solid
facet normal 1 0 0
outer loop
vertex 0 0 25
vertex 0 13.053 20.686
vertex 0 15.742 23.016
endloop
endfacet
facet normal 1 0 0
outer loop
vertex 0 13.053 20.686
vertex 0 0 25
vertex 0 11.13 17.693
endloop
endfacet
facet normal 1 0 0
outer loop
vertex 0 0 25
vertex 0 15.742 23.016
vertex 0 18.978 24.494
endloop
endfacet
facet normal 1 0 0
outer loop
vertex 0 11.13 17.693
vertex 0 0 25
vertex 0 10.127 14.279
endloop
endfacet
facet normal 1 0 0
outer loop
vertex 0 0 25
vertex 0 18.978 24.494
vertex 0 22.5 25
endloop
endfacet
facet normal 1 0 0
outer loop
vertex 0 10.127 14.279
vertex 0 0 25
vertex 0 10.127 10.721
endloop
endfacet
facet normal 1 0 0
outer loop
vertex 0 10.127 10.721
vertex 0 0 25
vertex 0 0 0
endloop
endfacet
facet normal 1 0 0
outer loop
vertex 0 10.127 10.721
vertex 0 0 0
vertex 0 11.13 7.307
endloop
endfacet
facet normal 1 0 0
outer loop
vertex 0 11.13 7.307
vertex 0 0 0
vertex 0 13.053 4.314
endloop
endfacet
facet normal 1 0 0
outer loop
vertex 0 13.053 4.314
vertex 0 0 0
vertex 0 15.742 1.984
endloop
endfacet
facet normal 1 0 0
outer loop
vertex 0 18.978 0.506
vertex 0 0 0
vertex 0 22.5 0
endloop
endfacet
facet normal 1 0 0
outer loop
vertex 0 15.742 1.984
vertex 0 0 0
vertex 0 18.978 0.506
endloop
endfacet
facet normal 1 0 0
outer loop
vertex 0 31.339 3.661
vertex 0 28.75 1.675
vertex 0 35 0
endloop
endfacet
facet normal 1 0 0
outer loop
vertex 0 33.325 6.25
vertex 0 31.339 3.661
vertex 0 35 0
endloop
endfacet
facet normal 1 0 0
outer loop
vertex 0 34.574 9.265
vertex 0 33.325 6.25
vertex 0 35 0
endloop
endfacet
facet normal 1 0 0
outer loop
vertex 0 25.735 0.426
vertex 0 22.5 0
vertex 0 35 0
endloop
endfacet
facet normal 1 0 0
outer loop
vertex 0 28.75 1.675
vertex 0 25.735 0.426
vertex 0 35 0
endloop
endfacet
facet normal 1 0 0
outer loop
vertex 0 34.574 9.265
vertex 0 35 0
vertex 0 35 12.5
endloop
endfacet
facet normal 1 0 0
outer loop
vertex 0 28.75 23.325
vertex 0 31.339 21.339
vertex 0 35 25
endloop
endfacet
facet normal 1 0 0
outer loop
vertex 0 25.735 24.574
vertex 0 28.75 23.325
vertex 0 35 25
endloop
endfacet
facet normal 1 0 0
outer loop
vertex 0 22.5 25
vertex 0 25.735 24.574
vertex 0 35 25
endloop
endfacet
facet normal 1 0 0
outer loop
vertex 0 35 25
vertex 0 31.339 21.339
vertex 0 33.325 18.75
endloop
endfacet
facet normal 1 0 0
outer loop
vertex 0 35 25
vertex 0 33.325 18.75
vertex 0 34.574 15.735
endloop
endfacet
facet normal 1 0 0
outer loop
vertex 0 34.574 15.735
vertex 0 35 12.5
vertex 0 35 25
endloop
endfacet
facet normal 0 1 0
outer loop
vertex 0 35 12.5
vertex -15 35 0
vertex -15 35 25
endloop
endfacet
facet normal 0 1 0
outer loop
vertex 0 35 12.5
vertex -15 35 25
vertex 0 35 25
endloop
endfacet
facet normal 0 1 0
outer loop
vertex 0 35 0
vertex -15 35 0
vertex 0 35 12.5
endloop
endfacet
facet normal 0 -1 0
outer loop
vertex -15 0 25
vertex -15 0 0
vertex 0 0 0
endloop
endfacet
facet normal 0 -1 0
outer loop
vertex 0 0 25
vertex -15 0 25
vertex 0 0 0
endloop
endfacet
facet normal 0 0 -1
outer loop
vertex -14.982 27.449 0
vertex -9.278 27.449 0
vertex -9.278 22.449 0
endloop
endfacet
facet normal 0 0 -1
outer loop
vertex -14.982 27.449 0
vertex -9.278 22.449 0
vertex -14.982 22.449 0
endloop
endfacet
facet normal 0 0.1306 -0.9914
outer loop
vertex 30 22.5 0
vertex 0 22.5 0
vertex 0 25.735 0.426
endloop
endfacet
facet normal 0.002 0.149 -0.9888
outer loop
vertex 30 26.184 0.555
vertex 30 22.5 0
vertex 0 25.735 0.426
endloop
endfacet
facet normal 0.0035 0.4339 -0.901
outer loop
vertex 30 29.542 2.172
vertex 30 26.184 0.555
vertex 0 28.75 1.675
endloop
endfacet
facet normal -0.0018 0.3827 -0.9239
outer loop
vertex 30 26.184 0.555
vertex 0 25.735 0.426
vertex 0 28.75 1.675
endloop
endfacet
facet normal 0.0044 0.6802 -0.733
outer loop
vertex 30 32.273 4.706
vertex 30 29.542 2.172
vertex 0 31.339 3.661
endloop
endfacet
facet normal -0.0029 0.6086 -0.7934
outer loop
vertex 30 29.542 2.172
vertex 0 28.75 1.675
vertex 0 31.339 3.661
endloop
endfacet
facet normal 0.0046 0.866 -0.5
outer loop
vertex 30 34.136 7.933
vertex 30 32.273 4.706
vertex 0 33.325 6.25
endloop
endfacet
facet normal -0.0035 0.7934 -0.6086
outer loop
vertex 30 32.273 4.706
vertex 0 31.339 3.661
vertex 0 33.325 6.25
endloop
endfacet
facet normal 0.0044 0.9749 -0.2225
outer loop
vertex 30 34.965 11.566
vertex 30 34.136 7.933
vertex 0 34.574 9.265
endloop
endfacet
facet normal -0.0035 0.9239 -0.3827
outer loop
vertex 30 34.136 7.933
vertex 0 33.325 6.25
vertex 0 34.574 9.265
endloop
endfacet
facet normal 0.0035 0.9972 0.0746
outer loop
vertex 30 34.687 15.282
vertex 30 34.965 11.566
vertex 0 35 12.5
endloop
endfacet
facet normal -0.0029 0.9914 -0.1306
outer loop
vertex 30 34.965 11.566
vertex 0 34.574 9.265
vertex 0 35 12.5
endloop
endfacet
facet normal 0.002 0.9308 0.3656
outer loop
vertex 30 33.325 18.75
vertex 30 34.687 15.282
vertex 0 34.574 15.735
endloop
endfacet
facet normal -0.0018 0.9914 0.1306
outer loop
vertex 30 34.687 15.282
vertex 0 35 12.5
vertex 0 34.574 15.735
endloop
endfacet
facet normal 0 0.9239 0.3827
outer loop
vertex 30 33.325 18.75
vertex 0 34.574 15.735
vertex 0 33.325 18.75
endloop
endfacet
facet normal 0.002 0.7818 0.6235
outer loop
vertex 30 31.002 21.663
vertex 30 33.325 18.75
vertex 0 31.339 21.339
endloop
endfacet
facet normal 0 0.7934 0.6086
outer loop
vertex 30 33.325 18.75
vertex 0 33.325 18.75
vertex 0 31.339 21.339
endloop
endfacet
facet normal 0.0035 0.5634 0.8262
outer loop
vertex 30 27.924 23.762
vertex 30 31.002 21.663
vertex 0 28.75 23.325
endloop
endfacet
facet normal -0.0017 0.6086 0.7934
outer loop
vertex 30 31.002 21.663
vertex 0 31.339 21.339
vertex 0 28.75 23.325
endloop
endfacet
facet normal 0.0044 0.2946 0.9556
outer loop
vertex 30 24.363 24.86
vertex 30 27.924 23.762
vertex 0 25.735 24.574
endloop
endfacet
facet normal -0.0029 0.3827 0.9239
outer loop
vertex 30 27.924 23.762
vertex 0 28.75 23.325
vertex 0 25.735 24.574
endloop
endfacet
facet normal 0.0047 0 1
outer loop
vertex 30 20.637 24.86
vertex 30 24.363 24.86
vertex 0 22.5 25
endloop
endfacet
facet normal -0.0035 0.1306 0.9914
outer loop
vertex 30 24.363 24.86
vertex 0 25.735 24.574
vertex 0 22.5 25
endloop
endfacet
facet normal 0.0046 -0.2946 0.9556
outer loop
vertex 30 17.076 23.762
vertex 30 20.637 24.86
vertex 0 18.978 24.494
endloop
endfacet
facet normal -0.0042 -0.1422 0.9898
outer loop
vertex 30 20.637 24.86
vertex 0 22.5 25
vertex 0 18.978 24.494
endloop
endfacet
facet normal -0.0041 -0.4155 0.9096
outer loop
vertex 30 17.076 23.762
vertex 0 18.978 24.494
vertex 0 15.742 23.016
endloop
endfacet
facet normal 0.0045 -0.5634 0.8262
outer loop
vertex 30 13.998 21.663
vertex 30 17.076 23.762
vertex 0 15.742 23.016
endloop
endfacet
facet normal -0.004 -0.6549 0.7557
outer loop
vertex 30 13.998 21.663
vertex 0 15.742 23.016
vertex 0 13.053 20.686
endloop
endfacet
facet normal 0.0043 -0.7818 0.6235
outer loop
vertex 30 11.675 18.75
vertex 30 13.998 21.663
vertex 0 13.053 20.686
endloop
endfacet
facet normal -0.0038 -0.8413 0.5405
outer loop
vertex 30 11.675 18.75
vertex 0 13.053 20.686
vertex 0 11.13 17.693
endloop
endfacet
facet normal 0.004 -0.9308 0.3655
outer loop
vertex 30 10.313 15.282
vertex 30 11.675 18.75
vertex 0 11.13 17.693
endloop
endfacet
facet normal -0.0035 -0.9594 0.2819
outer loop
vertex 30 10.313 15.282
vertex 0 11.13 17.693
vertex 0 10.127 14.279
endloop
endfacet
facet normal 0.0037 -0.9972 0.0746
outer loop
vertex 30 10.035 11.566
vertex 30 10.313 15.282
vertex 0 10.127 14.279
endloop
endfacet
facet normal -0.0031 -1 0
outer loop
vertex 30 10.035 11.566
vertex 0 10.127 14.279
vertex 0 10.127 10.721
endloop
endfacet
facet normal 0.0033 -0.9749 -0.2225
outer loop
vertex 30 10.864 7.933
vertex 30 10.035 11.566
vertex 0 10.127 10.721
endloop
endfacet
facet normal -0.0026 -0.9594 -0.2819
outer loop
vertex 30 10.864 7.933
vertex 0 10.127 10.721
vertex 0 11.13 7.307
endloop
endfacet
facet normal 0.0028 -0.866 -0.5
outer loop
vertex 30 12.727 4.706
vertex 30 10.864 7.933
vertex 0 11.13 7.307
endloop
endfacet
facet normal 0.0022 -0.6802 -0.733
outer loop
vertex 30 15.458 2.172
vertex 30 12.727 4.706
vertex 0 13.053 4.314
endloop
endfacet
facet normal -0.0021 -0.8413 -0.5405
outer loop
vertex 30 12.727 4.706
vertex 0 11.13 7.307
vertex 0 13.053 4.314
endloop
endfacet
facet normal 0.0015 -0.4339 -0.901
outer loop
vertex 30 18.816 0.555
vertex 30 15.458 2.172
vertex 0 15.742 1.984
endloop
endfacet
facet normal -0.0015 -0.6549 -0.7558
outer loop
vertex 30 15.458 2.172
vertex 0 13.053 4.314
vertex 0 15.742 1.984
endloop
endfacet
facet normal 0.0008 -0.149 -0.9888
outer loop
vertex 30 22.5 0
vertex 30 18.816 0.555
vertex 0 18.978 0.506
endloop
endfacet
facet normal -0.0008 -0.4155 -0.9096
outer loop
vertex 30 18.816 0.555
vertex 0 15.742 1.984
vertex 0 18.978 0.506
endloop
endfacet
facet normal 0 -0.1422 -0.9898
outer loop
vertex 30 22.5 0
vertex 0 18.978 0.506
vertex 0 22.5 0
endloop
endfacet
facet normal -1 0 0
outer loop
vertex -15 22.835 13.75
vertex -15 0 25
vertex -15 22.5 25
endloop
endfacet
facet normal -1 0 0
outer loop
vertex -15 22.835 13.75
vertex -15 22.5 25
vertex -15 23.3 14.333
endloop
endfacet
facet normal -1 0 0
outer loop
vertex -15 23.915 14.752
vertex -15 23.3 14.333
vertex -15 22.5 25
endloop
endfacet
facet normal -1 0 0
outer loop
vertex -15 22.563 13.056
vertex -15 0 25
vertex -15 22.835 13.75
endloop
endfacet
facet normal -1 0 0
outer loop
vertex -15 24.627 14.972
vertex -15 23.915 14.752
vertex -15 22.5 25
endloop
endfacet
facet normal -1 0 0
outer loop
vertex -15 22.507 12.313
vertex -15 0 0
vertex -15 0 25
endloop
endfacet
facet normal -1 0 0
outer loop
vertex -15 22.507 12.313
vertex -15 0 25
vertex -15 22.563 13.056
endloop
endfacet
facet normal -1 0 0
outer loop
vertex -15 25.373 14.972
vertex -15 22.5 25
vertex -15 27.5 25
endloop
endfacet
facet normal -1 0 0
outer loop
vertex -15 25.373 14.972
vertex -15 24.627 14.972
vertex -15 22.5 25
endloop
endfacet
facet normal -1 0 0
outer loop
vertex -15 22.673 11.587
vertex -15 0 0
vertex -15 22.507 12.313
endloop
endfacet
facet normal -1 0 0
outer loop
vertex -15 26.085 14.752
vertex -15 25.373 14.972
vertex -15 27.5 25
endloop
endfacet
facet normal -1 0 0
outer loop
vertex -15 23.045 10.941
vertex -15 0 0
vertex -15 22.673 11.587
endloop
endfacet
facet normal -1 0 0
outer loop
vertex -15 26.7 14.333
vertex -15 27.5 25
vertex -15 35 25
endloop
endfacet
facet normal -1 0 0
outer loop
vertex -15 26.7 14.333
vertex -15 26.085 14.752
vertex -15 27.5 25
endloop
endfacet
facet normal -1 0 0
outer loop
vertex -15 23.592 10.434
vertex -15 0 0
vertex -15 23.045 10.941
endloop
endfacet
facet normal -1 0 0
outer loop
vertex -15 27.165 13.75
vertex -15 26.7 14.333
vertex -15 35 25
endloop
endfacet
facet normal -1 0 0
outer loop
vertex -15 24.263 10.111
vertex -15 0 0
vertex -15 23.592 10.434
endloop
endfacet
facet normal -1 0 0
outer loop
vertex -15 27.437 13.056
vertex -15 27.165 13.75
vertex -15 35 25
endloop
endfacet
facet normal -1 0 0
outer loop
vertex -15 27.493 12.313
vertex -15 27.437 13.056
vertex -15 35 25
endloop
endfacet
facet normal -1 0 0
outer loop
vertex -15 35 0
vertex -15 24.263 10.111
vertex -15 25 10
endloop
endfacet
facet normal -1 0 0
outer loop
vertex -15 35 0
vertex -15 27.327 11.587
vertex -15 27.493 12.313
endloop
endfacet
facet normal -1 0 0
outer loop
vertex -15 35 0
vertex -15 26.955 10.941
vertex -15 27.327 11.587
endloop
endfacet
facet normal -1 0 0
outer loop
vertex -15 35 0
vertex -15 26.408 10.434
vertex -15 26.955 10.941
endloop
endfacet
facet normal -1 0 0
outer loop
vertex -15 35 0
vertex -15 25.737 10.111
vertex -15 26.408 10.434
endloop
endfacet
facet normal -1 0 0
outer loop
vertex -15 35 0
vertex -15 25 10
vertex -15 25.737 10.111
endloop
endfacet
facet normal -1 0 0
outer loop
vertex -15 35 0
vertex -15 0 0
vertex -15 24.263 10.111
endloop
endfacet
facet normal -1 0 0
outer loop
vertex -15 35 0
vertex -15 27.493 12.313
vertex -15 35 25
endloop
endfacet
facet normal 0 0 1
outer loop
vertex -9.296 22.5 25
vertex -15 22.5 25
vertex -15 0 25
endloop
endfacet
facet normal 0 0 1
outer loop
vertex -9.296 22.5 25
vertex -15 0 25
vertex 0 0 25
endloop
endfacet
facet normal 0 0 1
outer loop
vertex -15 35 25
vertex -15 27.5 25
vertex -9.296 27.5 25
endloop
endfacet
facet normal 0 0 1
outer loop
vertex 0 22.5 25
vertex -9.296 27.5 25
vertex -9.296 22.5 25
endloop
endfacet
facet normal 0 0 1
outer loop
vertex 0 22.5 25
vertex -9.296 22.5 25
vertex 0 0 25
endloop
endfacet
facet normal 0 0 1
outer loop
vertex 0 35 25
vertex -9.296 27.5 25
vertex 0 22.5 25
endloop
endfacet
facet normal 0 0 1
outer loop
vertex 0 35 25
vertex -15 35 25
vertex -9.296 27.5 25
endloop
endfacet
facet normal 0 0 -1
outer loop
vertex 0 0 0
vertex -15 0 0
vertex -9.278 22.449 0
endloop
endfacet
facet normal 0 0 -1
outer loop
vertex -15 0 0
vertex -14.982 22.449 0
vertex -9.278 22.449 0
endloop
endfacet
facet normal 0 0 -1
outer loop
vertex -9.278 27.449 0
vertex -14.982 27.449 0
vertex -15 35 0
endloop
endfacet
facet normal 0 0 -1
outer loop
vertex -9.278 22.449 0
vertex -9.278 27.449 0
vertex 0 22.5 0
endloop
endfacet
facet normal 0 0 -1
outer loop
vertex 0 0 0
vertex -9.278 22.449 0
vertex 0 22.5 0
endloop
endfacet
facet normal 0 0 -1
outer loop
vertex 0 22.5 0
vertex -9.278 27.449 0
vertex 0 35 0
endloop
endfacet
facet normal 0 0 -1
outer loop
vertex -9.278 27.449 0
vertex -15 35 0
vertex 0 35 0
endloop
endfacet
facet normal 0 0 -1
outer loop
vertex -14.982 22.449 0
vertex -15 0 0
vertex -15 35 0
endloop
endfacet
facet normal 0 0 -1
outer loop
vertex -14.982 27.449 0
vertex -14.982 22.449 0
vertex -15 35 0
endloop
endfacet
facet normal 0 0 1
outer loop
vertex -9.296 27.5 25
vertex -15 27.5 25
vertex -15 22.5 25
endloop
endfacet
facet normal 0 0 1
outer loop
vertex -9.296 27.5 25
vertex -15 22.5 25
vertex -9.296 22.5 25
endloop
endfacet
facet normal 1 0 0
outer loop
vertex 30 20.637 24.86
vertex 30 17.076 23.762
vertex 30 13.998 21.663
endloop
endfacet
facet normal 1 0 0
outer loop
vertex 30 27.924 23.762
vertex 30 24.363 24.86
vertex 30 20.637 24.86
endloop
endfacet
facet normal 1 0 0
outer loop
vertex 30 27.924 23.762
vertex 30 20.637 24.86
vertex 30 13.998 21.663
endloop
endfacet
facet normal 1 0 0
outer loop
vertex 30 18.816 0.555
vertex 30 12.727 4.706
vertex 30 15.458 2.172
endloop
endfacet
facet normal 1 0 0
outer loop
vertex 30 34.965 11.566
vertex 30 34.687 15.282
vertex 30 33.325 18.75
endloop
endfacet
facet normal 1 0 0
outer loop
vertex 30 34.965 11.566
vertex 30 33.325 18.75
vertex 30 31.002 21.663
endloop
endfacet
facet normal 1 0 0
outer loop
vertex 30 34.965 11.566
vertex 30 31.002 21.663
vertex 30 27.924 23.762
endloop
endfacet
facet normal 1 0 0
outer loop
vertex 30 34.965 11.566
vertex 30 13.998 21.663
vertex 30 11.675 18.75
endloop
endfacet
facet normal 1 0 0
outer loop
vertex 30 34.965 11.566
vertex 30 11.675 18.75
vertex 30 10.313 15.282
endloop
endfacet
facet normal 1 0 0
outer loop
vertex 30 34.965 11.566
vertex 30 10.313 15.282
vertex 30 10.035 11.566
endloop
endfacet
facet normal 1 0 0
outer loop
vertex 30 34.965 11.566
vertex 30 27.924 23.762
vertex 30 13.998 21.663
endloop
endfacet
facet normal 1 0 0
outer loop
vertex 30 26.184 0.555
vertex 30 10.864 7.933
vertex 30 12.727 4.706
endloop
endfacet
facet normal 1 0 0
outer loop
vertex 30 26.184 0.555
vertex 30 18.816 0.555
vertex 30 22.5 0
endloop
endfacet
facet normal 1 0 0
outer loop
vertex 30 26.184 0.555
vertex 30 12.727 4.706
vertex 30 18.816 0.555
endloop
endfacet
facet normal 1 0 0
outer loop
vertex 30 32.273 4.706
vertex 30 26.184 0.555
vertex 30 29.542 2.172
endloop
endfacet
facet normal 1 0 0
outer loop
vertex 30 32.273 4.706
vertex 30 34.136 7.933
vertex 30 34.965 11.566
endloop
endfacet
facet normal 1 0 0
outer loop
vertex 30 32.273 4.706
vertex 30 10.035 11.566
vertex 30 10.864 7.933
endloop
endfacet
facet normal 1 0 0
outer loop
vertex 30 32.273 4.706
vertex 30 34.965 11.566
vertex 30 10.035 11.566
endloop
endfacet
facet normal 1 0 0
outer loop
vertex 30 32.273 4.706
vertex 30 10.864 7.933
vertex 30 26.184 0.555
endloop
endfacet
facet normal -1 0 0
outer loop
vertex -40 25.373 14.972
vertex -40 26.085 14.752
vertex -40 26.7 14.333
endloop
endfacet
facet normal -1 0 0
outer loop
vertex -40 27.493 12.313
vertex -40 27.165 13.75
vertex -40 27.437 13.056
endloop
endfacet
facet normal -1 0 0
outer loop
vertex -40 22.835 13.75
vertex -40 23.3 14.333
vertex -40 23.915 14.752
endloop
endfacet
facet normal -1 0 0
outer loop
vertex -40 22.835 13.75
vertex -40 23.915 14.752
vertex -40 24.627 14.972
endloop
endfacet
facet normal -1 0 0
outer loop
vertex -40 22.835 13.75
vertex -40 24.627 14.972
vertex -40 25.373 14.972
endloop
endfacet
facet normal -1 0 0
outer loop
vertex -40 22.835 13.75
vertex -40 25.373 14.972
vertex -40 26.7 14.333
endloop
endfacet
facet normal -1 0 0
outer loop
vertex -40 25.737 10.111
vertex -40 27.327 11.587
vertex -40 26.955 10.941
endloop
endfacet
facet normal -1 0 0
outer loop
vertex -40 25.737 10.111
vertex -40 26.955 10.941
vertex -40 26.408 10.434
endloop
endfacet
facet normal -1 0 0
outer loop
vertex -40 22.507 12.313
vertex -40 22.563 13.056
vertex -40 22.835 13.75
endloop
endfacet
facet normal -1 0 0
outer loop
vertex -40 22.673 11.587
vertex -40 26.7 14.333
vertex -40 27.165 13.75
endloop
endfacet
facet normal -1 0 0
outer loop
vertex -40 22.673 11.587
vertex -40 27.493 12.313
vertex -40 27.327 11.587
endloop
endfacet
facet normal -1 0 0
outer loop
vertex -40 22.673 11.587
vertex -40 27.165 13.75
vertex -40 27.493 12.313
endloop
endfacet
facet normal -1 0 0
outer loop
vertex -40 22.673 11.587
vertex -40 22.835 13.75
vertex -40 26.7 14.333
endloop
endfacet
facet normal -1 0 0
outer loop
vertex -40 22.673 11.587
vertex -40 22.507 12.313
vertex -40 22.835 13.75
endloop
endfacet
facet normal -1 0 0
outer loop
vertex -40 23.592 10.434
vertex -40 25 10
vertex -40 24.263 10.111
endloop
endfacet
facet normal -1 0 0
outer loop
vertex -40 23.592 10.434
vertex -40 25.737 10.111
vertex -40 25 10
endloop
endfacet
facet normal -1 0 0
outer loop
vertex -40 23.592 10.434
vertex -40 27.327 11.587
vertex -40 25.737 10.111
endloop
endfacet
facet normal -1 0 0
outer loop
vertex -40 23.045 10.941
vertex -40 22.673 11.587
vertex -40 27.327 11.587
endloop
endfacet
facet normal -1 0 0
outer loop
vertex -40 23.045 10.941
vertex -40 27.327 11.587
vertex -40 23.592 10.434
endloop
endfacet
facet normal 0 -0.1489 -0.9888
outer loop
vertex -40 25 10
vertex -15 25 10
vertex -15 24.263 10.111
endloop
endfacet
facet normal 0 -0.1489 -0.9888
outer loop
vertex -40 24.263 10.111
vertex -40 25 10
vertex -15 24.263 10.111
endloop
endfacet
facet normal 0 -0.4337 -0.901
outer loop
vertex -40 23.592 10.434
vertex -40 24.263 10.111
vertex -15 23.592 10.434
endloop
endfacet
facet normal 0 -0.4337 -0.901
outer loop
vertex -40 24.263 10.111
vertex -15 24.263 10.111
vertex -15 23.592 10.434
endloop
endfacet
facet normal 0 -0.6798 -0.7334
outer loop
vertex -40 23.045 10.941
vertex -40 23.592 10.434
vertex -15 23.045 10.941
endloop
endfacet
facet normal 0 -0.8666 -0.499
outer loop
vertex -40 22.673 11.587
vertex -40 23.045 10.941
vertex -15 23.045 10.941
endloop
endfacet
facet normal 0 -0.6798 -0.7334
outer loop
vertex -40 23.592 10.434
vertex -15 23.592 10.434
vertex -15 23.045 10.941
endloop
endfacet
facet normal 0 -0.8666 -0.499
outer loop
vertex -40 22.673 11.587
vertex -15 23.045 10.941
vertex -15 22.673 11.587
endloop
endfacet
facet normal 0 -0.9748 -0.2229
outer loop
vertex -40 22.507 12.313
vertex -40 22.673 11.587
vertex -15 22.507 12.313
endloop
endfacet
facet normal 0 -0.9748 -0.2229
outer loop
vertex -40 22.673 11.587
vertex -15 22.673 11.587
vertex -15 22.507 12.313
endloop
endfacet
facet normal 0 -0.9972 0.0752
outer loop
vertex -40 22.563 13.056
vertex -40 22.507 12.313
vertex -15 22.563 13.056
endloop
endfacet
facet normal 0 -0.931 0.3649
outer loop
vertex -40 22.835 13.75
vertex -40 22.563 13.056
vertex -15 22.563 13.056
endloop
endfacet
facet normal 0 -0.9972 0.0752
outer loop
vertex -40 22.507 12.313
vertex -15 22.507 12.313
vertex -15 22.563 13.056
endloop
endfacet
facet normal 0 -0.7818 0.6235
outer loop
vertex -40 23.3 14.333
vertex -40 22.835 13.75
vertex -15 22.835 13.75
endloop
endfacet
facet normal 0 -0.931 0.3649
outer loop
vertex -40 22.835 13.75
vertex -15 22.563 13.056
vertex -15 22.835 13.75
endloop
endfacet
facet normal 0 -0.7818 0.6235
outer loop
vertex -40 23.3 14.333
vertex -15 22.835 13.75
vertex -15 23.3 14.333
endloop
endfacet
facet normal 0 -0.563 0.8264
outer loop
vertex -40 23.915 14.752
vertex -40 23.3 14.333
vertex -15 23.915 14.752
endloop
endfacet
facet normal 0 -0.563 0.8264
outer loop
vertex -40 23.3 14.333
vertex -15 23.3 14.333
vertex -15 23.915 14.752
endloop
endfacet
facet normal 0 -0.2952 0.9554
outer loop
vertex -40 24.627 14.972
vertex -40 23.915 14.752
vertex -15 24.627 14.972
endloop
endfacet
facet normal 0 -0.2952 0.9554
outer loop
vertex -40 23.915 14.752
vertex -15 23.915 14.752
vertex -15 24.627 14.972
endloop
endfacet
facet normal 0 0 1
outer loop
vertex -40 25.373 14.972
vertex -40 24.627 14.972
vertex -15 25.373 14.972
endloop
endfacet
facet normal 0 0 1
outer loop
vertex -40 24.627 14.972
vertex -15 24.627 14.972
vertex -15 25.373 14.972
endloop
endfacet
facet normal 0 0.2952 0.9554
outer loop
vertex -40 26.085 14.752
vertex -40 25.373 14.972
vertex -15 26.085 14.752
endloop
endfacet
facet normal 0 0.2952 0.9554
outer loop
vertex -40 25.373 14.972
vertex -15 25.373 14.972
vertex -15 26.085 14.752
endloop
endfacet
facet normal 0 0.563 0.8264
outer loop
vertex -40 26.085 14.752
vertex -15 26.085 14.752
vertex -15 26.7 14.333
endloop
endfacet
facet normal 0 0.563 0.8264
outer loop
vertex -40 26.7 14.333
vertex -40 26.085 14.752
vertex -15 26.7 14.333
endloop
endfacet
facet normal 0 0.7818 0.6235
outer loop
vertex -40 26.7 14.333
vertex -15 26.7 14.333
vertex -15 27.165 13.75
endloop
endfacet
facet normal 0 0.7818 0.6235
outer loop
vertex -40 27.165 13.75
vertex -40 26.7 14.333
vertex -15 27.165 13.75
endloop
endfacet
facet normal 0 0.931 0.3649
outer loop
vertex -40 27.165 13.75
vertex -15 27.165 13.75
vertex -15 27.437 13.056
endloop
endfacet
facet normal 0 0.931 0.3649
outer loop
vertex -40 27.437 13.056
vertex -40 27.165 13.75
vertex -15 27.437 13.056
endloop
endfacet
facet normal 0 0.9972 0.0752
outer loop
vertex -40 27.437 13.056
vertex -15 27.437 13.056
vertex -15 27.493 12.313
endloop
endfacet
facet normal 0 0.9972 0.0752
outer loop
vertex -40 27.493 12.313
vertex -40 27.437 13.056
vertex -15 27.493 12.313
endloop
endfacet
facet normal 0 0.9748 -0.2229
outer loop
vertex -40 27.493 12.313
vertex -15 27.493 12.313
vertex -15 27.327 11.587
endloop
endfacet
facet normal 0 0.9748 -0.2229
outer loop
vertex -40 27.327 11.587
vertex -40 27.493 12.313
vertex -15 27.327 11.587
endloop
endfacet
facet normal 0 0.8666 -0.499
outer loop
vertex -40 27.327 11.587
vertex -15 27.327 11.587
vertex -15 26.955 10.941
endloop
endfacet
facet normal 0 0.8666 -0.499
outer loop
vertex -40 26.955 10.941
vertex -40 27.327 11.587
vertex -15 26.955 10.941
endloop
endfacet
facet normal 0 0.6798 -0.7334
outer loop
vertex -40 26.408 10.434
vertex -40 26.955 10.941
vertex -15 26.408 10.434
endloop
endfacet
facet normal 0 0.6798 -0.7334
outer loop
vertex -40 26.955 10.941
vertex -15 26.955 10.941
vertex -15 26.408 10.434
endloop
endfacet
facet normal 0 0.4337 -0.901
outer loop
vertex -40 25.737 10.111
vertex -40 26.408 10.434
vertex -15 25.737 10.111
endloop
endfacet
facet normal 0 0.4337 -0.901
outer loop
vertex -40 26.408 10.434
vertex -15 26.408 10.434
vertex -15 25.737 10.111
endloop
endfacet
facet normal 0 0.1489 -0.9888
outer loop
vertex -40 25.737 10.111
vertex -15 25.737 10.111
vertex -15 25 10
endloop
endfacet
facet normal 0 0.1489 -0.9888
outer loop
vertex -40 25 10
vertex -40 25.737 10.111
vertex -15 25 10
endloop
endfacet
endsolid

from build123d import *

# Parameters (mm, degrees)
ESQUISSE1_W             = 15
ESQUISSE1_H             = 35
EXTRUSION1_DEPTH        = 25
ESQUISSE2_R             = 12.5
EXTRUSION2_DEPTH        = 30
ESQUISSE3_R             = 2.5
EXTRUSION4_DEPTH        = 25
ESQUISSE4_W             = 5.704163369
ESQUISSE4_H             = 5
ENL_V_MAT_EXTRU_1_DEPTH = 0.0001
ESQUISSE5_W             = 5.704163369
ESQUISSE5_H             = 5
ENL_V_MAT_EXTRU_2_DEPTH = 0.0001


with BuildPart() as part:
    # Esquisse1 → Extrusion1 (new body)
    with BuildSketch(Plane.XY):
        with Locations((-7.5, 17.5)):
            Rectangle(ESQUISSE1_W, ESQUISSE1_H)
    extrude(amount=EXTRUSION1_DEPTH)

    # Esquisse2 → Extrusion2 (add)
    with BuildSketch(Plane(origin=(0, 0, 0), x_dir=(0, 0, -1), z_dir=(1, 0, 0))):
        with Locations((-12.5, 22.5)):
            Circle(ESQUISSE2_R)
    extrude(amount=EXTRUSION2_DEPTH)

    # Esquisse3 → Extrusion4 (add)
    with BuildSketch(Plane.ZY.offset(15)):
        with Locations(Location((12.5, 25, 0), (0, 0, 180))):
            Circle(ESQUISSE3_R)
    extrude(amount=EXTRUSION4_DEPTH)

    # Esquisse4 → Enlèv. mat.-Extru.1 (cut)
    with BuildSketch(Plane.XY.offset(25)):
        with Locations((-12.147918316, 25)):
            Rectangle(ESQUISSE4_W, ESQUISSE4_H)
    extrude(amount=-ENL_V_MAT_EXTRU_1_DEPTH, mode=Mode.SUBTRACT)

    # Esquisse5 → Enlèv. mat.-Extru.2 (cut)
    with BuildSketch(Plane(origin=(0, 0, 0), x_dir=(-1, 0, 0), z_dir=(0, 0, -1))):
        with Locations((12.129729433, 24.948694164)):
            Rectangle(ESQUISSE5_W, ESQUISSE5_H)
    extrude(amount=-ENL_V_MAT_EXTRU_2_DEPTH, mode=Mode.SUBTRACT)


solid = part.part
